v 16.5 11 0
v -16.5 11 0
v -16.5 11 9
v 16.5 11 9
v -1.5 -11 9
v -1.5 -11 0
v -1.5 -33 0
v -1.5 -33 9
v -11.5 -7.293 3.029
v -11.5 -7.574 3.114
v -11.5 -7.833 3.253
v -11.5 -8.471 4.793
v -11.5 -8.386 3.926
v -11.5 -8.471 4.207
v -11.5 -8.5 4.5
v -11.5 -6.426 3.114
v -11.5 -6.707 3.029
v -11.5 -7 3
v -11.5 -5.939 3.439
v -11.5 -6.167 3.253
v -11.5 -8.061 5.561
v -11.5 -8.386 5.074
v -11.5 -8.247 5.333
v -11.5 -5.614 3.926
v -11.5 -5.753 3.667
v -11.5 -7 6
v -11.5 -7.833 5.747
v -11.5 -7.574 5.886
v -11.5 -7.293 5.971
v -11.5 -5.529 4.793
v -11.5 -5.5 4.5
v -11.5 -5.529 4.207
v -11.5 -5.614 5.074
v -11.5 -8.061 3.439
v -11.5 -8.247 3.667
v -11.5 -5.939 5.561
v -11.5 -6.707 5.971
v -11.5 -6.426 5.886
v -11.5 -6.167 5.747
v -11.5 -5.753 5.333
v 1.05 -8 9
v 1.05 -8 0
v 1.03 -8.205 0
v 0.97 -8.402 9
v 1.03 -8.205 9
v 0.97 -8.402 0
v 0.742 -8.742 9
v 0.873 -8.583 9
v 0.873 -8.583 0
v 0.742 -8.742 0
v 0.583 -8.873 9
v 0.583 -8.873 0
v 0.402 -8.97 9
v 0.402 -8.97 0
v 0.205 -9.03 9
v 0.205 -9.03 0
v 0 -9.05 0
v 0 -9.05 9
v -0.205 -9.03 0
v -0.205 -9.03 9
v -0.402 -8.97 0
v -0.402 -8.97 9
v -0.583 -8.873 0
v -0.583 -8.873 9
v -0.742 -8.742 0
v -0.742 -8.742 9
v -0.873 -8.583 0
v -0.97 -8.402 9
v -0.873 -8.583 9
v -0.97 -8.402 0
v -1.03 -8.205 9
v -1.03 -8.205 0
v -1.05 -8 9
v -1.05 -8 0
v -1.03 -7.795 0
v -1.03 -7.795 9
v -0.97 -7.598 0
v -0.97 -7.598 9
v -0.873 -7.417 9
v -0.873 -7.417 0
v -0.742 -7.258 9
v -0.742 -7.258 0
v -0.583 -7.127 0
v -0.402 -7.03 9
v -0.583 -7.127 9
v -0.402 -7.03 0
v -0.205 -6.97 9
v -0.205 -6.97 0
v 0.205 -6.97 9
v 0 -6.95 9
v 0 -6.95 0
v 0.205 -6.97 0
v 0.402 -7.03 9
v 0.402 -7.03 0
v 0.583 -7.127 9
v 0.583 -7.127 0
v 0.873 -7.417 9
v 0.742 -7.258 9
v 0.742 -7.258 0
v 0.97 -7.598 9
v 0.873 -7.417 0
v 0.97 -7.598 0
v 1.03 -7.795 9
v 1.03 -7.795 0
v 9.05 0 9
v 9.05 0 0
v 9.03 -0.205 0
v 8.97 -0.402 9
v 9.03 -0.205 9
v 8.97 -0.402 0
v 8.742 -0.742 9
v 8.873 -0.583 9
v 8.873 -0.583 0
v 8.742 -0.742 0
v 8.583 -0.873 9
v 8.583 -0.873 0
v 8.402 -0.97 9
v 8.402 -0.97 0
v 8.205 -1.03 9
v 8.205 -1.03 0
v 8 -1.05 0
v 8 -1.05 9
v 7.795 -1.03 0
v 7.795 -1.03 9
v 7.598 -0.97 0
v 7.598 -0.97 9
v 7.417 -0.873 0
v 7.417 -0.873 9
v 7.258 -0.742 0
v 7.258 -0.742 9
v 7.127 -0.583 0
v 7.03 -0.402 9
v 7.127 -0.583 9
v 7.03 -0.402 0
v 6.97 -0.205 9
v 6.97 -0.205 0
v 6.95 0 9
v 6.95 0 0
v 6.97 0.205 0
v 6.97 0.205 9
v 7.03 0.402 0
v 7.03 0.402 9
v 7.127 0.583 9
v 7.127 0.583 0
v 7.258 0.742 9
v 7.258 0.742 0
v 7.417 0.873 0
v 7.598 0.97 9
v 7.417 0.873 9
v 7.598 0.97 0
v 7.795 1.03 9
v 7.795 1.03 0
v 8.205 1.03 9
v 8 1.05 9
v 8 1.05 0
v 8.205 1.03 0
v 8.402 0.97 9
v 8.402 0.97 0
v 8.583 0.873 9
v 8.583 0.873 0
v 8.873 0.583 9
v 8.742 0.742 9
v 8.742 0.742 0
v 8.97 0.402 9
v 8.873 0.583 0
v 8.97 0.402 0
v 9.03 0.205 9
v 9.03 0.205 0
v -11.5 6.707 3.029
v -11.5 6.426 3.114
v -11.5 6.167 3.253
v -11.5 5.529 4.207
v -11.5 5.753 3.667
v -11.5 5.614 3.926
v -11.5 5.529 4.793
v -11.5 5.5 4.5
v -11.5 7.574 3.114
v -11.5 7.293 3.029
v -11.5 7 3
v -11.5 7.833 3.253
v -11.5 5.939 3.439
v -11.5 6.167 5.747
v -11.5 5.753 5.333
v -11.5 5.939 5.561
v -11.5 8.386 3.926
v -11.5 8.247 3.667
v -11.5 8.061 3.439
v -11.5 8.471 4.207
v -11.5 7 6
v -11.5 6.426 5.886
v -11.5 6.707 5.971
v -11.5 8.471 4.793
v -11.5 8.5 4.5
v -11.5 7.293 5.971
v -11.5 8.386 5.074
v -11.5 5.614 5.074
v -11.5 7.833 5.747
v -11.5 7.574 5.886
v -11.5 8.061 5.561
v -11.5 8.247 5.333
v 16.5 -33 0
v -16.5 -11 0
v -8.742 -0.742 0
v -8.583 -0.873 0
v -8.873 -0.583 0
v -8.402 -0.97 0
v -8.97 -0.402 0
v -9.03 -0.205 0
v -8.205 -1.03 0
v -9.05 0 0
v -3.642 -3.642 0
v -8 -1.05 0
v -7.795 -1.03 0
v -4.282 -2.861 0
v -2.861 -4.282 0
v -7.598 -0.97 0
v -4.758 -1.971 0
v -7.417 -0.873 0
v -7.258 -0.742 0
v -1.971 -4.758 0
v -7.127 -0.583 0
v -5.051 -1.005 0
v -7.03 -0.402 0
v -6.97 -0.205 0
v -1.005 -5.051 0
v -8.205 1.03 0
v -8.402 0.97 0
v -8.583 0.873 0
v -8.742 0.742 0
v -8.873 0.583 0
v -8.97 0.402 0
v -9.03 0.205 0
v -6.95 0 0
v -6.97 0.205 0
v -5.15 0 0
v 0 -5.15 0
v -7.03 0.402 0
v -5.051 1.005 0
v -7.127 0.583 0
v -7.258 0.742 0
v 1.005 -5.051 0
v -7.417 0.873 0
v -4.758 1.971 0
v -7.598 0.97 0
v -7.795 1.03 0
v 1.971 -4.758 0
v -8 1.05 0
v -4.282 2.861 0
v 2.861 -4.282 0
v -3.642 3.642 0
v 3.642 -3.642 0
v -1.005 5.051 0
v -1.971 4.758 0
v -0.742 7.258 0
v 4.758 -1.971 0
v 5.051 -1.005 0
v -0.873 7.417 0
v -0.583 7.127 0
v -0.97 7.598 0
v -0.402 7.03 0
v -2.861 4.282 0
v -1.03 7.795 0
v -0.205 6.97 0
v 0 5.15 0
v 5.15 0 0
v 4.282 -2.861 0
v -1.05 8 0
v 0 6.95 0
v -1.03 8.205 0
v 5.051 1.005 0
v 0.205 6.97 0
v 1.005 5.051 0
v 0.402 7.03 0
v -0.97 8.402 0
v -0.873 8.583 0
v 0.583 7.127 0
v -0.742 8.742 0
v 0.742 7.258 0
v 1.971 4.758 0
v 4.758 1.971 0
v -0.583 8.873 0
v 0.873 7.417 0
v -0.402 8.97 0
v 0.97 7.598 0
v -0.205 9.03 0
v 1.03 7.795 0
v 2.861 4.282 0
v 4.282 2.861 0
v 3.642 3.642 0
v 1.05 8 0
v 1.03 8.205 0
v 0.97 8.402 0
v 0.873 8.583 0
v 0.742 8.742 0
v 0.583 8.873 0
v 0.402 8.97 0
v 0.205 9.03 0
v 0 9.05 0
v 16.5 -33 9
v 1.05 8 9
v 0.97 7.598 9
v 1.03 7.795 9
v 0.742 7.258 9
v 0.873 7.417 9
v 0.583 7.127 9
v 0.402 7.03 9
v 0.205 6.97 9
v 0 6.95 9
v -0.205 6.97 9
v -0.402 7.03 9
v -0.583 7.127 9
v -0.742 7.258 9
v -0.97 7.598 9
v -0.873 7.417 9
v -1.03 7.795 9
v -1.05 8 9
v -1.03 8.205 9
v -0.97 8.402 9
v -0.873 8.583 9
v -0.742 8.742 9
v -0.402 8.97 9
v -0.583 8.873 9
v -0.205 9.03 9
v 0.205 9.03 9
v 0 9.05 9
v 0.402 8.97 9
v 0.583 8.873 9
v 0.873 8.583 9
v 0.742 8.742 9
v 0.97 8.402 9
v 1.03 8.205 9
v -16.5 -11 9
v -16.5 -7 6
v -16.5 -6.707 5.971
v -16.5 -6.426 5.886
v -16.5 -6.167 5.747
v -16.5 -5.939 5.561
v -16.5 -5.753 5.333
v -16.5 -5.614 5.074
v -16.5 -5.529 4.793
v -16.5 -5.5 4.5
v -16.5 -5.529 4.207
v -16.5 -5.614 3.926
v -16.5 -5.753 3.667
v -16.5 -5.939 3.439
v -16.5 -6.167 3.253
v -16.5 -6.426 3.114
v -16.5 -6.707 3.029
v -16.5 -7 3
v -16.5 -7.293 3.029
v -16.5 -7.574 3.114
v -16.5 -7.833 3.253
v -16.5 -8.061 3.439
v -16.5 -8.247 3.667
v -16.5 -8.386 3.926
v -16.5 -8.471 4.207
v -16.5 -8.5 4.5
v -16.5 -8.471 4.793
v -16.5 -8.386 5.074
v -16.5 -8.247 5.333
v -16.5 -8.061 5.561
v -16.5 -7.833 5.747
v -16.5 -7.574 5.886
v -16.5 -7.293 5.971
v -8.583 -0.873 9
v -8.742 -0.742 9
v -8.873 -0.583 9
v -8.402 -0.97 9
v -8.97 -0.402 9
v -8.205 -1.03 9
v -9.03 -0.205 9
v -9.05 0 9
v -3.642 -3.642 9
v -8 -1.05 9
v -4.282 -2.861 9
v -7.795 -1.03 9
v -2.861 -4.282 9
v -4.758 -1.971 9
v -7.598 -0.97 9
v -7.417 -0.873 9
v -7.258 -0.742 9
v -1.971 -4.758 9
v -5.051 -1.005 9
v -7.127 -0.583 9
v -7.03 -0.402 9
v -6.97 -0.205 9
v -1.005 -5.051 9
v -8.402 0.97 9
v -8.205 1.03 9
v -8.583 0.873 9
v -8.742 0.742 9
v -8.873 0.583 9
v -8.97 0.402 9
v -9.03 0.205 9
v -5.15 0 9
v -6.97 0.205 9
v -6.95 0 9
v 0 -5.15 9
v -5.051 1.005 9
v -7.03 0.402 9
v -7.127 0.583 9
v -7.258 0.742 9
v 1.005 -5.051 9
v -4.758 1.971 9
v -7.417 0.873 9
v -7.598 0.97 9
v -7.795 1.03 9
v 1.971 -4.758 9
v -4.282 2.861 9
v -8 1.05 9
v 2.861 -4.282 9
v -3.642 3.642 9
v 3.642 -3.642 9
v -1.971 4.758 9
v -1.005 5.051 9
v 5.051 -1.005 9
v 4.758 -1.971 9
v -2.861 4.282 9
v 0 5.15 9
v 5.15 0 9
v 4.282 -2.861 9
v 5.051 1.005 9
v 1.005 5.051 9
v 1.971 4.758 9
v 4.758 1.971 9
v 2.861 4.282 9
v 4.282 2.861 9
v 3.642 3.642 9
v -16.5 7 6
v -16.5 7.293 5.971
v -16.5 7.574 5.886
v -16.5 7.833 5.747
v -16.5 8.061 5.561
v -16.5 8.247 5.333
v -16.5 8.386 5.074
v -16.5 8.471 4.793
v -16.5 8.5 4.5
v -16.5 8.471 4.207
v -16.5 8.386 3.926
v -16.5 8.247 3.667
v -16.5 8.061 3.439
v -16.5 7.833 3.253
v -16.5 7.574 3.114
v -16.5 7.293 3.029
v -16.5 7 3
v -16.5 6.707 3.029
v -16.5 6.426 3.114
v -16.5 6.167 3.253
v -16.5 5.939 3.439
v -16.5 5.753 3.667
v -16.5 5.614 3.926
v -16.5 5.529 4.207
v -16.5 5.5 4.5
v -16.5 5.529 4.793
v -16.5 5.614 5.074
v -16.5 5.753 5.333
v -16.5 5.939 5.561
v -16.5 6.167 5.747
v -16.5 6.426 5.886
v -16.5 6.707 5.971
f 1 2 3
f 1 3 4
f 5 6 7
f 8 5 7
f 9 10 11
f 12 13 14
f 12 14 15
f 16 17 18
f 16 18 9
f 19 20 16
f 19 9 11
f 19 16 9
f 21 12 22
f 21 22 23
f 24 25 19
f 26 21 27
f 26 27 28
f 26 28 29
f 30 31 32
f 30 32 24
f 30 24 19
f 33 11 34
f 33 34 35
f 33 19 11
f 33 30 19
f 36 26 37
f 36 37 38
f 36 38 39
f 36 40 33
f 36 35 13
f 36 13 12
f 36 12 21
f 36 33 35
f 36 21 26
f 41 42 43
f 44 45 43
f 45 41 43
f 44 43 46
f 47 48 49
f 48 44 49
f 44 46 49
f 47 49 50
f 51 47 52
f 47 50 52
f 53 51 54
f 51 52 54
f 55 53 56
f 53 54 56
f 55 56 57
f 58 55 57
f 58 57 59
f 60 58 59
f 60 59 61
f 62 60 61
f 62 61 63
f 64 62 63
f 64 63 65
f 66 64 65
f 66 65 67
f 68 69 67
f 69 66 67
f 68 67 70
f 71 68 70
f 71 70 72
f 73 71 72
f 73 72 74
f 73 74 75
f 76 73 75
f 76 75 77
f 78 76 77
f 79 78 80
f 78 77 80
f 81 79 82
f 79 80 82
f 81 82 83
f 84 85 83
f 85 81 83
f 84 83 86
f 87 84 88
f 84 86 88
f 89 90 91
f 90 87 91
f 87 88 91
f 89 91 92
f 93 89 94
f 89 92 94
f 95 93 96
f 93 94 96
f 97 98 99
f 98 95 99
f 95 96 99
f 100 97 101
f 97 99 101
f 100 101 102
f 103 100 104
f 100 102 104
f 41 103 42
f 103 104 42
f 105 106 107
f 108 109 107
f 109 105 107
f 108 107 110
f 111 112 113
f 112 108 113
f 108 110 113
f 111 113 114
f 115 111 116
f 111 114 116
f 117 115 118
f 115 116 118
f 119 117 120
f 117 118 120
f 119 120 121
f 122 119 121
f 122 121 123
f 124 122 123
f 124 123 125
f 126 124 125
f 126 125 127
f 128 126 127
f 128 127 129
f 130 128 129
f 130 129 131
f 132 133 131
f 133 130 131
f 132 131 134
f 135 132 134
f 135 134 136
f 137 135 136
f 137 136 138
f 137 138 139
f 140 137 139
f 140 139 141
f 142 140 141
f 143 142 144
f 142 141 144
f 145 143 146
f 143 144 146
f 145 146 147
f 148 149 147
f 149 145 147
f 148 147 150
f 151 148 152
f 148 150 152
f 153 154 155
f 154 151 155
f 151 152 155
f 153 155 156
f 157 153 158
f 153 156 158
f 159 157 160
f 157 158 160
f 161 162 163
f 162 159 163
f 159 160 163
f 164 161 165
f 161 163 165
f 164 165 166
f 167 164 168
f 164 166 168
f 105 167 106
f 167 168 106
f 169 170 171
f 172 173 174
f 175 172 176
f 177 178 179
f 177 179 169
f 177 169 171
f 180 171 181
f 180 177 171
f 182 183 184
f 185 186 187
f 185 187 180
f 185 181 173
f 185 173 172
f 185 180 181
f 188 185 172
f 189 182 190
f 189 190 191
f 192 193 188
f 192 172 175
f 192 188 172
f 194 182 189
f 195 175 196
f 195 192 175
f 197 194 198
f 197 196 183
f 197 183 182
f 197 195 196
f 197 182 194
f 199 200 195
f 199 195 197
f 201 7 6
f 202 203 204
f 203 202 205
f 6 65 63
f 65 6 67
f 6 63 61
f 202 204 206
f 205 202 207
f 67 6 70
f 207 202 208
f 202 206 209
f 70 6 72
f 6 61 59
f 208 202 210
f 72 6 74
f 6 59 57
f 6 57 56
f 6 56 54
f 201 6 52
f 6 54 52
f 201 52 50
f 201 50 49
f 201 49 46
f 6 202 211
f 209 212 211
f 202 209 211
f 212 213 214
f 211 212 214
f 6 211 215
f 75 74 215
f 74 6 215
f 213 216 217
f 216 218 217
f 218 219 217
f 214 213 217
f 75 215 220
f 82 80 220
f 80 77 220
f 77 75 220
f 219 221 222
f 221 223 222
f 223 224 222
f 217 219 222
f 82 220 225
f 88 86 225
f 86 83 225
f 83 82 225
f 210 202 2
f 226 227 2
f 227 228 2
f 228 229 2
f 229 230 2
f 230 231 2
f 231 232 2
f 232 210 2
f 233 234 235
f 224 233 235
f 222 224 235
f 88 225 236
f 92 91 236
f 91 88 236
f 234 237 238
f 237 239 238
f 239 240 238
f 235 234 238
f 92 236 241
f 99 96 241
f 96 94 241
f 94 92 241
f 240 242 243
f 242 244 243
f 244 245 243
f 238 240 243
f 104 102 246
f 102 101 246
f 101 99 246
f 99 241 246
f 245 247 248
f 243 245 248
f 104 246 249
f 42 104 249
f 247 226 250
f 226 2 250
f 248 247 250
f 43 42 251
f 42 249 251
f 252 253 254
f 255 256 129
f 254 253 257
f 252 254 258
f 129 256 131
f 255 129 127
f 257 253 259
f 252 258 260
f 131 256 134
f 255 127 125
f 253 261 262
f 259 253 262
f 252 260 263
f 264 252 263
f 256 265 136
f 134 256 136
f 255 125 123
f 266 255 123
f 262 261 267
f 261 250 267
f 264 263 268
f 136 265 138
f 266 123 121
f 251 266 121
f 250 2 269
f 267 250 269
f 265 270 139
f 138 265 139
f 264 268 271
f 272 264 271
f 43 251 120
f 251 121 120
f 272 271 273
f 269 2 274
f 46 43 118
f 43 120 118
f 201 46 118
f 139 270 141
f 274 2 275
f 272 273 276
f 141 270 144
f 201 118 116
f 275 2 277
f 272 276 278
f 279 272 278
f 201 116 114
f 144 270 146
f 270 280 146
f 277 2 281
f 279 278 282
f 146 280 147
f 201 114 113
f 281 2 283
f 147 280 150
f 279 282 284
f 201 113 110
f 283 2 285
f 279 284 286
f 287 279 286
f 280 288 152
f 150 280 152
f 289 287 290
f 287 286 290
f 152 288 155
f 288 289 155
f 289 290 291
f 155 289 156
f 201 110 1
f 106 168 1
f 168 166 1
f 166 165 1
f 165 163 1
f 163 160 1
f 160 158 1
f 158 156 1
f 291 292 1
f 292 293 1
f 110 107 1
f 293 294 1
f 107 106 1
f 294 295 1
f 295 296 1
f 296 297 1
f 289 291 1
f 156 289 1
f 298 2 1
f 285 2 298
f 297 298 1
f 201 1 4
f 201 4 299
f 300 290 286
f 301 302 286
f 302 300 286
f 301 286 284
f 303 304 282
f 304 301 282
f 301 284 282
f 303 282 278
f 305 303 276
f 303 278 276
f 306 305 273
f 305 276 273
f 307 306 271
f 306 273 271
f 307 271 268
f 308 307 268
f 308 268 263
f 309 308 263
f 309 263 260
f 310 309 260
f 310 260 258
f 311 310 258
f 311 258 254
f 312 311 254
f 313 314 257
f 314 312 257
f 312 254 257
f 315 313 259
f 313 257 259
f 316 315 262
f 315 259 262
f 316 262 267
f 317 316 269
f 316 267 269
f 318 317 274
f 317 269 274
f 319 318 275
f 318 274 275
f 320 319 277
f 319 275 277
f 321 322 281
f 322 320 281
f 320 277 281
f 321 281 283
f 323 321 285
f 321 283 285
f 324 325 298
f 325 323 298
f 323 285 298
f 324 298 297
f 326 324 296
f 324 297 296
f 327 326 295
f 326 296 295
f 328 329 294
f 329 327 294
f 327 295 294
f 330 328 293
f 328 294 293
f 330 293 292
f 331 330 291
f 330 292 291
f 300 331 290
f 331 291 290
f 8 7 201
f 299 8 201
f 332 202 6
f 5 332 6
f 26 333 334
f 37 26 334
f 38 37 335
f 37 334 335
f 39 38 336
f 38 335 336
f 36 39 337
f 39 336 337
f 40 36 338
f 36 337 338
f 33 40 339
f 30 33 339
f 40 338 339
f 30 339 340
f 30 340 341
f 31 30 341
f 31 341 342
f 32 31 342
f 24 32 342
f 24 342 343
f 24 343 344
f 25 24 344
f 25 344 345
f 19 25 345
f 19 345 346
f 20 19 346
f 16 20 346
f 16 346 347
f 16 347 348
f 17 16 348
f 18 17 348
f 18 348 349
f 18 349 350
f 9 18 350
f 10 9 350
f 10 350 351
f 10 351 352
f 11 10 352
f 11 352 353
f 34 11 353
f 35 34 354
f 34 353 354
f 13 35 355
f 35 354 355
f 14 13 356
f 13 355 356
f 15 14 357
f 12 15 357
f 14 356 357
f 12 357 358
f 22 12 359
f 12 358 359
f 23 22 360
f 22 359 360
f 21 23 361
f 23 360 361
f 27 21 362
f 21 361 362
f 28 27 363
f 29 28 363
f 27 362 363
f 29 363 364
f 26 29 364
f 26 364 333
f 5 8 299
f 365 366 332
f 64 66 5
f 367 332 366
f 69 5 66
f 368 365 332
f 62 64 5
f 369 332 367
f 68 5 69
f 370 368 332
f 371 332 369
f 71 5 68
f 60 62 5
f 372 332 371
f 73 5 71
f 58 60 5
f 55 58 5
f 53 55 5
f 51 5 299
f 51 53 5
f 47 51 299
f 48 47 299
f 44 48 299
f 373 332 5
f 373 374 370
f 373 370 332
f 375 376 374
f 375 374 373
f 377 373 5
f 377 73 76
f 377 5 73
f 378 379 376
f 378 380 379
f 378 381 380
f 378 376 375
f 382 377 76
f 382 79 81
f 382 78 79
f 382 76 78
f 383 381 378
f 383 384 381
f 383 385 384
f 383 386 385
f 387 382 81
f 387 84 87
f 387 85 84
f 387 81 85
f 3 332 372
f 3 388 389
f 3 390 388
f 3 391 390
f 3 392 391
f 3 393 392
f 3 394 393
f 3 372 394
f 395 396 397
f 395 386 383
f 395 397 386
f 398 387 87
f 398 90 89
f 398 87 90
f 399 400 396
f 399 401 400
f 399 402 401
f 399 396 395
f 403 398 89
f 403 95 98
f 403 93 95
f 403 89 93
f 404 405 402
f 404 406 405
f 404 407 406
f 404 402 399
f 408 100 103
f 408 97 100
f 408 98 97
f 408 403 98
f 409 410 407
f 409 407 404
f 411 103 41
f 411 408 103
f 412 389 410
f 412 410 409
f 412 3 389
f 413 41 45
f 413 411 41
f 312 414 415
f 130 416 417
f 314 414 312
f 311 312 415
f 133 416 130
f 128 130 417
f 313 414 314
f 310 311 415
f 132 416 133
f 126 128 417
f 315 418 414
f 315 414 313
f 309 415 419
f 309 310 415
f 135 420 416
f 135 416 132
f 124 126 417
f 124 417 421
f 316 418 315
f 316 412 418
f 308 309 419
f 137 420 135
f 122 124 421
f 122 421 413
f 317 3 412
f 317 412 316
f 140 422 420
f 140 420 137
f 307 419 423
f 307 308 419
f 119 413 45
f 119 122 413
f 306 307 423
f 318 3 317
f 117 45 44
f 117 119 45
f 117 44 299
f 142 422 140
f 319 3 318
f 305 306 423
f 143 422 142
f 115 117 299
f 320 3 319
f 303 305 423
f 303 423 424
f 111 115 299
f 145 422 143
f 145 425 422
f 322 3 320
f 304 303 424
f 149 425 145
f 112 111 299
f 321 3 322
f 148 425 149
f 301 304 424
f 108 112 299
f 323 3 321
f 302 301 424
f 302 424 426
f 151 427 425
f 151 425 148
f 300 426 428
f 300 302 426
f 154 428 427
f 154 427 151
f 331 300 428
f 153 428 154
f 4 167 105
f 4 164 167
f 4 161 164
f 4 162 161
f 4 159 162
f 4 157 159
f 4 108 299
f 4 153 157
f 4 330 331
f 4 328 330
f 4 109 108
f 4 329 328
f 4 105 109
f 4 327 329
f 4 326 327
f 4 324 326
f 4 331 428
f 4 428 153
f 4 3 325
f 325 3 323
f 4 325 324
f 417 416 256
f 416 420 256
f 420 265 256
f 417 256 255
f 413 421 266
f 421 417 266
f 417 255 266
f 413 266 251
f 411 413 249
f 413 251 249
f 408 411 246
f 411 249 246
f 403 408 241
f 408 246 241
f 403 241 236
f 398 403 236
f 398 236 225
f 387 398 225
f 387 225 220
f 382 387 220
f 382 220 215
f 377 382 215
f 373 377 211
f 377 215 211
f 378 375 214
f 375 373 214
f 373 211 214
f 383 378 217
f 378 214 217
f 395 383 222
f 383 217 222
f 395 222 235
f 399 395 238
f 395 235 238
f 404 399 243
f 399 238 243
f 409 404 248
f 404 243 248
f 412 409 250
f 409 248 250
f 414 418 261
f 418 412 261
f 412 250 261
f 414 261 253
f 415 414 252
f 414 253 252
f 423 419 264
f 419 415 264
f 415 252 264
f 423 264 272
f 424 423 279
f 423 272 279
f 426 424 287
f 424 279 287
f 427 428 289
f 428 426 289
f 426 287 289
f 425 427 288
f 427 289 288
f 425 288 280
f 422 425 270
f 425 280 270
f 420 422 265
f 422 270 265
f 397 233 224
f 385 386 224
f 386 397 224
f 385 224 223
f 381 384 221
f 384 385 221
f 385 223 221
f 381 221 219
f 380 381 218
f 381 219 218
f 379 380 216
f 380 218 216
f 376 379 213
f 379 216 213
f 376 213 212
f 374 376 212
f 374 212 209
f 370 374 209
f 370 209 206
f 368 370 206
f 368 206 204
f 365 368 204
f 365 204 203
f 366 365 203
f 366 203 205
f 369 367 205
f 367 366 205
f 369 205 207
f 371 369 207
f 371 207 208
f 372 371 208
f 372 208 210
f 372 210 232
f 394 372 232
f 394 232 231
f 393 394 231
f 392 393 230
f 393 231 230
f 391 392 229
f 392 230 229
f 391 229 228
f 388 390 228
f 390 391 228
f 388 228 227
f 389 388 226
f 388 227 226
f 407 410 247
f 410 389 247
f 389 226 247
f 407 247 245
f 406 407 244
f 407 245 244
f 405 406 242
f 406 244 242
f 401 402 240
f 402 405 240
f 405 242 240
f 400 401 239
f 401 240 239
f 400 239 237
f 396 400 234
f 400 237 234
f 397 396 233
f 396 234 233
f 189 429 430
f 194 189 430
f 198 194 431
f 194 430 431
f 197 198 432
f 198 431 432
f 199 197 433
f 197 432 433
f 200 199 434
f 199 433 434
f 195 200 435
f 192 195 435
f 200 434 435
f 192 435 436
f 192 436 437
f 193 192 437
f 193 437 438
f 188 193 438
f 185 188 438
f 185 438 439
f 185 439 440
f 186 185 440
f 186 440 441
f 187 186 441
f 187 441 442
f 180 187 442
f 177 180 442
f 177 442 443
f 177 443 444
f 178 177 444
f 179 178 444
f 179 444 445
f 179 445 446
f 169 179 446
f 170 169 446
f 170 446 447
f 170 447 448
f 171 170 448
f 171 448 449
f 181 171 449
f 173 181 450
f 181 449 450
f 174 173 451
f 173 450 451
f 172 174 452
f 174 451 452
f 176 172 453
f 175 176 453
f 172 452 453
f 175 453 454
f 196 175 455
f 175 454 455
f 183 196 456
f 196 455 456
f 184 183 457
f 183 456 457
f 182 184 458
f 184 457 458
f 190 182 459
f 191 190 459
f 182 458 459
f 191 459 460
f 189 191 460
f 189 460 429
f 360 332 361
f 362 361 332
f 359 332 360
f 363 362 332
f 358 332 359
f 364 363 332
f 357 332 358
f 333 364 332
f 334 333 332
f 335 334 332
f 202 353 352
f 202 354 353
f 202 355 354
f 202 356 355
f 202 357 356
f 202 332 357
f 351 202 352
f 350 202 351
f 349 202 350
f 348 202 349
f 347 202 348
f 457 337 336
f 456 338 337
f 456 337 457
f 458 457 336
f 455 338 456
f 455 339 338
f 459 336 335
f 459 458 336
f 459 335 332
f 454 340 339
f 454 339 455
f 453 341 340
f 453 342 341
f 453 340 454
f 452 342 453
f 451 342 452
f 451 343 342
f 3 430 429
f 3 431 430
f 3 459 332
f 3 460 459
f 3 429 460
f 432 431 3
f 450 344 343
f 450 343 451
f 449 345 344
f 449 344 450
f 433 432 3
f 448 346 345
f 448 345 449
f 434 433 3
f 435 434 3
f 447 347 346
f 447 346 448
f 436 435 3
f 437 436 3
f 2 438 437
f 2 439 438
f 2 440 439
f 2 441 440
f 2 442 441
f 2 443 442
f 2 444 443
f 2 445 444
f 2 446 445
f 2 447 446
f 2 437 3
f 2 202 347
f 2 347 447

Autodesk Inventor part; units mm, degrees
ref_plane "YZ Plane" through (0, 0, 0) normal (1, 0, 0) x (0, 1, 0)
ref_plane "XZ Plane" through (0, 0, 0) normal (0, 1, 0) x (-1, 0, 0)
ref_plane "XY Plane" through (0, 0, 0) normal (0, 0, 1) x (1, 0, 0)
sketch "Sketch1" plane through (0, 0, 0) normal (0, 0, 1) x (1, 0, 0)
  line L0 (-16.5, 11) -> (16.5, 11)
  line L1 (16.5, 11) -> (16.5, -11)
  line L2 (16.5, -11) -> (-16.5, -11) construction
  line L3 (-16.5, -11) -> (-16.5, 11)
  line L4 (-16.5, 11) -> (16.5, -11) construction
  line L5 (16.5, 11) -> (-16.5, -11) construction
  line L6 (-16.5, -11) -> (-1.5, -11)
  line L7 (-1.5, -11) -> (-1.5, -33)
  line L8 (-1.5, -33) -> (16.5, -33)
  line L9 (16.5, -33) -> (16.5, -11)
  circle A0 centre (0, 0) radius 5.15
  circle A1 centre (0, 8) radius 1.05
  circle A2 centre (-8, 0) radius 1.05
  circle A3 centre (0, -8) radius 1.05
  circle A4 centre (8, 0) radius 1.05
  dimension "d0" = 33
  dimension "d1" = 22
  dimension "d2" = 15
  dimension "d3" = 44
  dimension "d4" = 10.3
  dimension "d5" = 8
  dimension "d8" = 360
  dimension "d10" = 2.1
extrude "Extrusion1" add sketch "Sketch1" along normal blind 9
sketch "Sketch2" plane through (-16.5, -11, 0) normal (-1, 0, 0) x (0, 0, 1)
  circle A0 centre (4.5, 4) radius 1.5
  line L0 (0, 0) -> (9, 0) construction
  line L1 (9, 22) -> (9, 0) projected
  line L2 (0, 11) -> (9, 11) construction
  line L3 (0, 22) -> (0, 0) projected
  circle A1 centre (4.5, 18) radius 1.5
  point P0 (0, 11)
  point P1 (4.5, 0)
  dimension "d13" = 3
  dimension "d14" = 4
extrude "Extrusion2" cut sketch "Sketch2" against normal blind 5
properties part number "batente_microswitch_001" material "ABS Plastic"
